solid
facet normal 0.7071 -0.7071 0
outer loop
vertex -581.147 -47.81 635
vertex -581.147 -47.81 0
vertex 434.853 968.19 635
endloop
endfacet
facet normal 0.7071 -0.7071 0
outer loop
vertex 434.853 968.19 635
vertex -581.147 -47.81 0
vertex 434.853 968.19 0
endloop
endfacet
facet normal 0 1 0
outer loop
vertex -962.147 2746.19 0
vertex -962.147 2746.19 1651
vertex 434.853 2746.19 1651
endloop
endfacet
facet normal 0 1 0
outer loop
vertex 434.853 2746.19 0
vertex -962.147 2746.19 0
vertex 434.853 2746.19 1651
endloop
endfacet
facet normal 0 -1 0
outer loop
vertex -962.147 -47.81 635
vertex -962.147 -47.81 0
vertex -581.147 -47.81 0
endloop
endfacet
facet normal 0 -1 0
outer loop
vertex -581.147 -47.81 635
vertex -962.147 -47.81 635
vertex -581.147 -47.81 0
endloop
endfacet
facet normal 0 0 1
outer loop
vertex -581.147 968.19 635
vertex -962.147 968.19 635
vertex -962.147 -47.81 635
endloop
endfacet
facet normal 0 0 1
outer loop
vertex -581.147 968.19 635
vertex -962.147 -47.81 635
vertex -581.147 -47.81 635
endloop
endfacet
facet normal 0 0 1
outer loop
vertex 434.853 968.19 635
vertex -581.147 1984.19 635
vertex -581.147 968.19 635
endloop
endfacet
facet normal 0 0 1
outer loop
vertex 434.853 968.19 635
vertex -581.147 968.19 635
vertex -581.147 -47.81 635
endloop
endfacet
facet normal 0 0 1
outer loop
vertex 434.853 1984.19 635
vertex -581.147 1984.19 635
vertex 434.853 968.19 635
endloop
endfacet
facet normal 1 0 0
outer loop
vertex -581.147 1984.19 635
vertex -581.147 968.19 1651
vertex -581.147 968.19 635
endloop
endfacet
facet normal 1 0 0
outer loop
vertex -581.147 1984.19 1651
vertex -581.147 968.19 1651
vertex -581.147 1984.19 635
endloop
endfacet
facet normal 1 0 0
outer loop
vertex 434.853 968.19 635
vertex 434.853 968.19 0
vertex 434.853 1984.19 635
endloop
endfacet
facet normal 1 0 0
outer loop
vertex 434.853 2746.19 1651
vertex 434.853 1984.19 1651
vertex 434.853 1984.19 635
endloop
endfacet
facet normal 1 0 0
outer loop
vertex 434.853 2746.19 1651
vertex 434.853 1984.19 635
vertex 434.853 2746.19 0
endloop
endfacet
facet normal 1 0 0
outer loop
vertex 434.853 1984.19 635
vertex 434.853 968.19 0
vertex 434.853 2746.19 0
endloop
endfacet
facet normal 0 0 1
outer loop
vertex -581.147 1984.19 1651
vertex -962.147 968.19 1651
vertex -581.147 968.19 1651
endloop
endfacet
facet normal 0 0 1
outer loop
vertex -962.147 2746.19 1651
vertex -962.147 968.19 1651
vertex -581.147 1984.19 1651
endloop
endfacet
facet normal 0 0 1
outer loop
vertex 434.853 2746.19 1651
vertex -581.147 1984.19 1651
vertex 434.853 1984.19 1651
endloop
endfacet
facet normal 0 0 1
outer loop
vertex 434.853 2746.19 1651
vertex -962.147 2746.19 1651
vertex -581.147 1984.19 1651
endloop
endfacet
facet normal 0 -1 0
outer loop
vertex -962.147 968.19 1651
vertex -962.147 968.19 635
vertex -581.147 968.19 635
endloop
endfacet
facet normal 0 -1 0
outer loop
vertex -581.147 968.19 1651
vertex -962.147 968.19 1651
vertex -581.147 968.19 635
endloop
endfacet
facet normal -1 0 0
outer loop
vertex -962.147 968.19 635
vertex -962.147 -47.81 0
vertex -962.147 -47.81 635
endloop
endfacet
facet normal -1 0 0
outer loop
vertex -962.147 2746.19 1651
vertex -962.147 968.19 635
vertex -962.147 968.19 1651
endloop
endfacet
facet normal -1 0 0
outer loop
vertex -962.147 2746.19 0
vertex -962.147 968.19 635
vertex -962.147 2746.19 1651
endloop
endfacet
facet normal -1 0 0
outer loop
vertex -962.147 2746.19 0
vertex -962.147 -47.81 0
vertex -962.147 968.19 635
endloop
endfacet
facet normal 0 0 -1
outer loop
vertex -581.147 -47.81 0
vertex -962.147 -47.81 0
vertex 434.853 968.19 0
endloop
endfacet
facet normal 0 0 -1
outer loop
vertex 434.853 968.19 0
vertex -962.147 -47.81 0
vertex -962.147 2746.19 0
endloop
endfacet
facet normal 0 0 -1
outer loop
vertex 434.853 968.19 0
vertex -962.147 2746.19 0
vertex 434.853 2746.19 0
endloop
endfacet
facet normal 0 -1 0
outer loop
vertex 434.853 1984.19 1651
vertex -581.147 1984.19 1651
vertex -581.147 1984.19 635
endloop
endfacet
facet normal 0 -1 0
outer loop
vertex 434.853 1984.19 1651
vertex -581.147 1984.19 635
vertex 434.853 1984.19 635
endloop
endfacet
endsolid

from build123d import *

# Parameters (mm, degrees)
F1_DEPTH = 635
F2_W     = 1397
F2_H     = 1778
F3_DEPTH = 1016
F4_W     = 1016
F4_H     = 1016
F5_DEPTH = 1016


with BuildPart() as f1:
    # F0 (on Top) → F1 (new body)
    with BuildSketch(Plane.XY):
        Polygon((434.853258, 2746.190321), (-962.146742, 2746.190321), (-962.146742, -47.809679), (-581.146742, -47.809679), (434.853258, 968.190321), align=None)
    extrude(amount=F1_DEPTH)

    # F2 (on face) → F3 (join)
    with BuildSketch(Plane.XY.offset(635)):
        with Locations((-263.646742, 1857.190321)):
            Rectangle(F2_W, F2_H)
    extrude(amount=F3_DEPTH)

    # F4 (on face) → F5 (cut)
    with BuildSketch(Plane.XY.offset(1651)):
        with Locations((-73.146742, 1476.190321)):
            Rectangle(F4_W, F4_H)
    extrude(amount=-F5_DEPTH, mode=Mode.SUBTRACT)


solid = f1.part
